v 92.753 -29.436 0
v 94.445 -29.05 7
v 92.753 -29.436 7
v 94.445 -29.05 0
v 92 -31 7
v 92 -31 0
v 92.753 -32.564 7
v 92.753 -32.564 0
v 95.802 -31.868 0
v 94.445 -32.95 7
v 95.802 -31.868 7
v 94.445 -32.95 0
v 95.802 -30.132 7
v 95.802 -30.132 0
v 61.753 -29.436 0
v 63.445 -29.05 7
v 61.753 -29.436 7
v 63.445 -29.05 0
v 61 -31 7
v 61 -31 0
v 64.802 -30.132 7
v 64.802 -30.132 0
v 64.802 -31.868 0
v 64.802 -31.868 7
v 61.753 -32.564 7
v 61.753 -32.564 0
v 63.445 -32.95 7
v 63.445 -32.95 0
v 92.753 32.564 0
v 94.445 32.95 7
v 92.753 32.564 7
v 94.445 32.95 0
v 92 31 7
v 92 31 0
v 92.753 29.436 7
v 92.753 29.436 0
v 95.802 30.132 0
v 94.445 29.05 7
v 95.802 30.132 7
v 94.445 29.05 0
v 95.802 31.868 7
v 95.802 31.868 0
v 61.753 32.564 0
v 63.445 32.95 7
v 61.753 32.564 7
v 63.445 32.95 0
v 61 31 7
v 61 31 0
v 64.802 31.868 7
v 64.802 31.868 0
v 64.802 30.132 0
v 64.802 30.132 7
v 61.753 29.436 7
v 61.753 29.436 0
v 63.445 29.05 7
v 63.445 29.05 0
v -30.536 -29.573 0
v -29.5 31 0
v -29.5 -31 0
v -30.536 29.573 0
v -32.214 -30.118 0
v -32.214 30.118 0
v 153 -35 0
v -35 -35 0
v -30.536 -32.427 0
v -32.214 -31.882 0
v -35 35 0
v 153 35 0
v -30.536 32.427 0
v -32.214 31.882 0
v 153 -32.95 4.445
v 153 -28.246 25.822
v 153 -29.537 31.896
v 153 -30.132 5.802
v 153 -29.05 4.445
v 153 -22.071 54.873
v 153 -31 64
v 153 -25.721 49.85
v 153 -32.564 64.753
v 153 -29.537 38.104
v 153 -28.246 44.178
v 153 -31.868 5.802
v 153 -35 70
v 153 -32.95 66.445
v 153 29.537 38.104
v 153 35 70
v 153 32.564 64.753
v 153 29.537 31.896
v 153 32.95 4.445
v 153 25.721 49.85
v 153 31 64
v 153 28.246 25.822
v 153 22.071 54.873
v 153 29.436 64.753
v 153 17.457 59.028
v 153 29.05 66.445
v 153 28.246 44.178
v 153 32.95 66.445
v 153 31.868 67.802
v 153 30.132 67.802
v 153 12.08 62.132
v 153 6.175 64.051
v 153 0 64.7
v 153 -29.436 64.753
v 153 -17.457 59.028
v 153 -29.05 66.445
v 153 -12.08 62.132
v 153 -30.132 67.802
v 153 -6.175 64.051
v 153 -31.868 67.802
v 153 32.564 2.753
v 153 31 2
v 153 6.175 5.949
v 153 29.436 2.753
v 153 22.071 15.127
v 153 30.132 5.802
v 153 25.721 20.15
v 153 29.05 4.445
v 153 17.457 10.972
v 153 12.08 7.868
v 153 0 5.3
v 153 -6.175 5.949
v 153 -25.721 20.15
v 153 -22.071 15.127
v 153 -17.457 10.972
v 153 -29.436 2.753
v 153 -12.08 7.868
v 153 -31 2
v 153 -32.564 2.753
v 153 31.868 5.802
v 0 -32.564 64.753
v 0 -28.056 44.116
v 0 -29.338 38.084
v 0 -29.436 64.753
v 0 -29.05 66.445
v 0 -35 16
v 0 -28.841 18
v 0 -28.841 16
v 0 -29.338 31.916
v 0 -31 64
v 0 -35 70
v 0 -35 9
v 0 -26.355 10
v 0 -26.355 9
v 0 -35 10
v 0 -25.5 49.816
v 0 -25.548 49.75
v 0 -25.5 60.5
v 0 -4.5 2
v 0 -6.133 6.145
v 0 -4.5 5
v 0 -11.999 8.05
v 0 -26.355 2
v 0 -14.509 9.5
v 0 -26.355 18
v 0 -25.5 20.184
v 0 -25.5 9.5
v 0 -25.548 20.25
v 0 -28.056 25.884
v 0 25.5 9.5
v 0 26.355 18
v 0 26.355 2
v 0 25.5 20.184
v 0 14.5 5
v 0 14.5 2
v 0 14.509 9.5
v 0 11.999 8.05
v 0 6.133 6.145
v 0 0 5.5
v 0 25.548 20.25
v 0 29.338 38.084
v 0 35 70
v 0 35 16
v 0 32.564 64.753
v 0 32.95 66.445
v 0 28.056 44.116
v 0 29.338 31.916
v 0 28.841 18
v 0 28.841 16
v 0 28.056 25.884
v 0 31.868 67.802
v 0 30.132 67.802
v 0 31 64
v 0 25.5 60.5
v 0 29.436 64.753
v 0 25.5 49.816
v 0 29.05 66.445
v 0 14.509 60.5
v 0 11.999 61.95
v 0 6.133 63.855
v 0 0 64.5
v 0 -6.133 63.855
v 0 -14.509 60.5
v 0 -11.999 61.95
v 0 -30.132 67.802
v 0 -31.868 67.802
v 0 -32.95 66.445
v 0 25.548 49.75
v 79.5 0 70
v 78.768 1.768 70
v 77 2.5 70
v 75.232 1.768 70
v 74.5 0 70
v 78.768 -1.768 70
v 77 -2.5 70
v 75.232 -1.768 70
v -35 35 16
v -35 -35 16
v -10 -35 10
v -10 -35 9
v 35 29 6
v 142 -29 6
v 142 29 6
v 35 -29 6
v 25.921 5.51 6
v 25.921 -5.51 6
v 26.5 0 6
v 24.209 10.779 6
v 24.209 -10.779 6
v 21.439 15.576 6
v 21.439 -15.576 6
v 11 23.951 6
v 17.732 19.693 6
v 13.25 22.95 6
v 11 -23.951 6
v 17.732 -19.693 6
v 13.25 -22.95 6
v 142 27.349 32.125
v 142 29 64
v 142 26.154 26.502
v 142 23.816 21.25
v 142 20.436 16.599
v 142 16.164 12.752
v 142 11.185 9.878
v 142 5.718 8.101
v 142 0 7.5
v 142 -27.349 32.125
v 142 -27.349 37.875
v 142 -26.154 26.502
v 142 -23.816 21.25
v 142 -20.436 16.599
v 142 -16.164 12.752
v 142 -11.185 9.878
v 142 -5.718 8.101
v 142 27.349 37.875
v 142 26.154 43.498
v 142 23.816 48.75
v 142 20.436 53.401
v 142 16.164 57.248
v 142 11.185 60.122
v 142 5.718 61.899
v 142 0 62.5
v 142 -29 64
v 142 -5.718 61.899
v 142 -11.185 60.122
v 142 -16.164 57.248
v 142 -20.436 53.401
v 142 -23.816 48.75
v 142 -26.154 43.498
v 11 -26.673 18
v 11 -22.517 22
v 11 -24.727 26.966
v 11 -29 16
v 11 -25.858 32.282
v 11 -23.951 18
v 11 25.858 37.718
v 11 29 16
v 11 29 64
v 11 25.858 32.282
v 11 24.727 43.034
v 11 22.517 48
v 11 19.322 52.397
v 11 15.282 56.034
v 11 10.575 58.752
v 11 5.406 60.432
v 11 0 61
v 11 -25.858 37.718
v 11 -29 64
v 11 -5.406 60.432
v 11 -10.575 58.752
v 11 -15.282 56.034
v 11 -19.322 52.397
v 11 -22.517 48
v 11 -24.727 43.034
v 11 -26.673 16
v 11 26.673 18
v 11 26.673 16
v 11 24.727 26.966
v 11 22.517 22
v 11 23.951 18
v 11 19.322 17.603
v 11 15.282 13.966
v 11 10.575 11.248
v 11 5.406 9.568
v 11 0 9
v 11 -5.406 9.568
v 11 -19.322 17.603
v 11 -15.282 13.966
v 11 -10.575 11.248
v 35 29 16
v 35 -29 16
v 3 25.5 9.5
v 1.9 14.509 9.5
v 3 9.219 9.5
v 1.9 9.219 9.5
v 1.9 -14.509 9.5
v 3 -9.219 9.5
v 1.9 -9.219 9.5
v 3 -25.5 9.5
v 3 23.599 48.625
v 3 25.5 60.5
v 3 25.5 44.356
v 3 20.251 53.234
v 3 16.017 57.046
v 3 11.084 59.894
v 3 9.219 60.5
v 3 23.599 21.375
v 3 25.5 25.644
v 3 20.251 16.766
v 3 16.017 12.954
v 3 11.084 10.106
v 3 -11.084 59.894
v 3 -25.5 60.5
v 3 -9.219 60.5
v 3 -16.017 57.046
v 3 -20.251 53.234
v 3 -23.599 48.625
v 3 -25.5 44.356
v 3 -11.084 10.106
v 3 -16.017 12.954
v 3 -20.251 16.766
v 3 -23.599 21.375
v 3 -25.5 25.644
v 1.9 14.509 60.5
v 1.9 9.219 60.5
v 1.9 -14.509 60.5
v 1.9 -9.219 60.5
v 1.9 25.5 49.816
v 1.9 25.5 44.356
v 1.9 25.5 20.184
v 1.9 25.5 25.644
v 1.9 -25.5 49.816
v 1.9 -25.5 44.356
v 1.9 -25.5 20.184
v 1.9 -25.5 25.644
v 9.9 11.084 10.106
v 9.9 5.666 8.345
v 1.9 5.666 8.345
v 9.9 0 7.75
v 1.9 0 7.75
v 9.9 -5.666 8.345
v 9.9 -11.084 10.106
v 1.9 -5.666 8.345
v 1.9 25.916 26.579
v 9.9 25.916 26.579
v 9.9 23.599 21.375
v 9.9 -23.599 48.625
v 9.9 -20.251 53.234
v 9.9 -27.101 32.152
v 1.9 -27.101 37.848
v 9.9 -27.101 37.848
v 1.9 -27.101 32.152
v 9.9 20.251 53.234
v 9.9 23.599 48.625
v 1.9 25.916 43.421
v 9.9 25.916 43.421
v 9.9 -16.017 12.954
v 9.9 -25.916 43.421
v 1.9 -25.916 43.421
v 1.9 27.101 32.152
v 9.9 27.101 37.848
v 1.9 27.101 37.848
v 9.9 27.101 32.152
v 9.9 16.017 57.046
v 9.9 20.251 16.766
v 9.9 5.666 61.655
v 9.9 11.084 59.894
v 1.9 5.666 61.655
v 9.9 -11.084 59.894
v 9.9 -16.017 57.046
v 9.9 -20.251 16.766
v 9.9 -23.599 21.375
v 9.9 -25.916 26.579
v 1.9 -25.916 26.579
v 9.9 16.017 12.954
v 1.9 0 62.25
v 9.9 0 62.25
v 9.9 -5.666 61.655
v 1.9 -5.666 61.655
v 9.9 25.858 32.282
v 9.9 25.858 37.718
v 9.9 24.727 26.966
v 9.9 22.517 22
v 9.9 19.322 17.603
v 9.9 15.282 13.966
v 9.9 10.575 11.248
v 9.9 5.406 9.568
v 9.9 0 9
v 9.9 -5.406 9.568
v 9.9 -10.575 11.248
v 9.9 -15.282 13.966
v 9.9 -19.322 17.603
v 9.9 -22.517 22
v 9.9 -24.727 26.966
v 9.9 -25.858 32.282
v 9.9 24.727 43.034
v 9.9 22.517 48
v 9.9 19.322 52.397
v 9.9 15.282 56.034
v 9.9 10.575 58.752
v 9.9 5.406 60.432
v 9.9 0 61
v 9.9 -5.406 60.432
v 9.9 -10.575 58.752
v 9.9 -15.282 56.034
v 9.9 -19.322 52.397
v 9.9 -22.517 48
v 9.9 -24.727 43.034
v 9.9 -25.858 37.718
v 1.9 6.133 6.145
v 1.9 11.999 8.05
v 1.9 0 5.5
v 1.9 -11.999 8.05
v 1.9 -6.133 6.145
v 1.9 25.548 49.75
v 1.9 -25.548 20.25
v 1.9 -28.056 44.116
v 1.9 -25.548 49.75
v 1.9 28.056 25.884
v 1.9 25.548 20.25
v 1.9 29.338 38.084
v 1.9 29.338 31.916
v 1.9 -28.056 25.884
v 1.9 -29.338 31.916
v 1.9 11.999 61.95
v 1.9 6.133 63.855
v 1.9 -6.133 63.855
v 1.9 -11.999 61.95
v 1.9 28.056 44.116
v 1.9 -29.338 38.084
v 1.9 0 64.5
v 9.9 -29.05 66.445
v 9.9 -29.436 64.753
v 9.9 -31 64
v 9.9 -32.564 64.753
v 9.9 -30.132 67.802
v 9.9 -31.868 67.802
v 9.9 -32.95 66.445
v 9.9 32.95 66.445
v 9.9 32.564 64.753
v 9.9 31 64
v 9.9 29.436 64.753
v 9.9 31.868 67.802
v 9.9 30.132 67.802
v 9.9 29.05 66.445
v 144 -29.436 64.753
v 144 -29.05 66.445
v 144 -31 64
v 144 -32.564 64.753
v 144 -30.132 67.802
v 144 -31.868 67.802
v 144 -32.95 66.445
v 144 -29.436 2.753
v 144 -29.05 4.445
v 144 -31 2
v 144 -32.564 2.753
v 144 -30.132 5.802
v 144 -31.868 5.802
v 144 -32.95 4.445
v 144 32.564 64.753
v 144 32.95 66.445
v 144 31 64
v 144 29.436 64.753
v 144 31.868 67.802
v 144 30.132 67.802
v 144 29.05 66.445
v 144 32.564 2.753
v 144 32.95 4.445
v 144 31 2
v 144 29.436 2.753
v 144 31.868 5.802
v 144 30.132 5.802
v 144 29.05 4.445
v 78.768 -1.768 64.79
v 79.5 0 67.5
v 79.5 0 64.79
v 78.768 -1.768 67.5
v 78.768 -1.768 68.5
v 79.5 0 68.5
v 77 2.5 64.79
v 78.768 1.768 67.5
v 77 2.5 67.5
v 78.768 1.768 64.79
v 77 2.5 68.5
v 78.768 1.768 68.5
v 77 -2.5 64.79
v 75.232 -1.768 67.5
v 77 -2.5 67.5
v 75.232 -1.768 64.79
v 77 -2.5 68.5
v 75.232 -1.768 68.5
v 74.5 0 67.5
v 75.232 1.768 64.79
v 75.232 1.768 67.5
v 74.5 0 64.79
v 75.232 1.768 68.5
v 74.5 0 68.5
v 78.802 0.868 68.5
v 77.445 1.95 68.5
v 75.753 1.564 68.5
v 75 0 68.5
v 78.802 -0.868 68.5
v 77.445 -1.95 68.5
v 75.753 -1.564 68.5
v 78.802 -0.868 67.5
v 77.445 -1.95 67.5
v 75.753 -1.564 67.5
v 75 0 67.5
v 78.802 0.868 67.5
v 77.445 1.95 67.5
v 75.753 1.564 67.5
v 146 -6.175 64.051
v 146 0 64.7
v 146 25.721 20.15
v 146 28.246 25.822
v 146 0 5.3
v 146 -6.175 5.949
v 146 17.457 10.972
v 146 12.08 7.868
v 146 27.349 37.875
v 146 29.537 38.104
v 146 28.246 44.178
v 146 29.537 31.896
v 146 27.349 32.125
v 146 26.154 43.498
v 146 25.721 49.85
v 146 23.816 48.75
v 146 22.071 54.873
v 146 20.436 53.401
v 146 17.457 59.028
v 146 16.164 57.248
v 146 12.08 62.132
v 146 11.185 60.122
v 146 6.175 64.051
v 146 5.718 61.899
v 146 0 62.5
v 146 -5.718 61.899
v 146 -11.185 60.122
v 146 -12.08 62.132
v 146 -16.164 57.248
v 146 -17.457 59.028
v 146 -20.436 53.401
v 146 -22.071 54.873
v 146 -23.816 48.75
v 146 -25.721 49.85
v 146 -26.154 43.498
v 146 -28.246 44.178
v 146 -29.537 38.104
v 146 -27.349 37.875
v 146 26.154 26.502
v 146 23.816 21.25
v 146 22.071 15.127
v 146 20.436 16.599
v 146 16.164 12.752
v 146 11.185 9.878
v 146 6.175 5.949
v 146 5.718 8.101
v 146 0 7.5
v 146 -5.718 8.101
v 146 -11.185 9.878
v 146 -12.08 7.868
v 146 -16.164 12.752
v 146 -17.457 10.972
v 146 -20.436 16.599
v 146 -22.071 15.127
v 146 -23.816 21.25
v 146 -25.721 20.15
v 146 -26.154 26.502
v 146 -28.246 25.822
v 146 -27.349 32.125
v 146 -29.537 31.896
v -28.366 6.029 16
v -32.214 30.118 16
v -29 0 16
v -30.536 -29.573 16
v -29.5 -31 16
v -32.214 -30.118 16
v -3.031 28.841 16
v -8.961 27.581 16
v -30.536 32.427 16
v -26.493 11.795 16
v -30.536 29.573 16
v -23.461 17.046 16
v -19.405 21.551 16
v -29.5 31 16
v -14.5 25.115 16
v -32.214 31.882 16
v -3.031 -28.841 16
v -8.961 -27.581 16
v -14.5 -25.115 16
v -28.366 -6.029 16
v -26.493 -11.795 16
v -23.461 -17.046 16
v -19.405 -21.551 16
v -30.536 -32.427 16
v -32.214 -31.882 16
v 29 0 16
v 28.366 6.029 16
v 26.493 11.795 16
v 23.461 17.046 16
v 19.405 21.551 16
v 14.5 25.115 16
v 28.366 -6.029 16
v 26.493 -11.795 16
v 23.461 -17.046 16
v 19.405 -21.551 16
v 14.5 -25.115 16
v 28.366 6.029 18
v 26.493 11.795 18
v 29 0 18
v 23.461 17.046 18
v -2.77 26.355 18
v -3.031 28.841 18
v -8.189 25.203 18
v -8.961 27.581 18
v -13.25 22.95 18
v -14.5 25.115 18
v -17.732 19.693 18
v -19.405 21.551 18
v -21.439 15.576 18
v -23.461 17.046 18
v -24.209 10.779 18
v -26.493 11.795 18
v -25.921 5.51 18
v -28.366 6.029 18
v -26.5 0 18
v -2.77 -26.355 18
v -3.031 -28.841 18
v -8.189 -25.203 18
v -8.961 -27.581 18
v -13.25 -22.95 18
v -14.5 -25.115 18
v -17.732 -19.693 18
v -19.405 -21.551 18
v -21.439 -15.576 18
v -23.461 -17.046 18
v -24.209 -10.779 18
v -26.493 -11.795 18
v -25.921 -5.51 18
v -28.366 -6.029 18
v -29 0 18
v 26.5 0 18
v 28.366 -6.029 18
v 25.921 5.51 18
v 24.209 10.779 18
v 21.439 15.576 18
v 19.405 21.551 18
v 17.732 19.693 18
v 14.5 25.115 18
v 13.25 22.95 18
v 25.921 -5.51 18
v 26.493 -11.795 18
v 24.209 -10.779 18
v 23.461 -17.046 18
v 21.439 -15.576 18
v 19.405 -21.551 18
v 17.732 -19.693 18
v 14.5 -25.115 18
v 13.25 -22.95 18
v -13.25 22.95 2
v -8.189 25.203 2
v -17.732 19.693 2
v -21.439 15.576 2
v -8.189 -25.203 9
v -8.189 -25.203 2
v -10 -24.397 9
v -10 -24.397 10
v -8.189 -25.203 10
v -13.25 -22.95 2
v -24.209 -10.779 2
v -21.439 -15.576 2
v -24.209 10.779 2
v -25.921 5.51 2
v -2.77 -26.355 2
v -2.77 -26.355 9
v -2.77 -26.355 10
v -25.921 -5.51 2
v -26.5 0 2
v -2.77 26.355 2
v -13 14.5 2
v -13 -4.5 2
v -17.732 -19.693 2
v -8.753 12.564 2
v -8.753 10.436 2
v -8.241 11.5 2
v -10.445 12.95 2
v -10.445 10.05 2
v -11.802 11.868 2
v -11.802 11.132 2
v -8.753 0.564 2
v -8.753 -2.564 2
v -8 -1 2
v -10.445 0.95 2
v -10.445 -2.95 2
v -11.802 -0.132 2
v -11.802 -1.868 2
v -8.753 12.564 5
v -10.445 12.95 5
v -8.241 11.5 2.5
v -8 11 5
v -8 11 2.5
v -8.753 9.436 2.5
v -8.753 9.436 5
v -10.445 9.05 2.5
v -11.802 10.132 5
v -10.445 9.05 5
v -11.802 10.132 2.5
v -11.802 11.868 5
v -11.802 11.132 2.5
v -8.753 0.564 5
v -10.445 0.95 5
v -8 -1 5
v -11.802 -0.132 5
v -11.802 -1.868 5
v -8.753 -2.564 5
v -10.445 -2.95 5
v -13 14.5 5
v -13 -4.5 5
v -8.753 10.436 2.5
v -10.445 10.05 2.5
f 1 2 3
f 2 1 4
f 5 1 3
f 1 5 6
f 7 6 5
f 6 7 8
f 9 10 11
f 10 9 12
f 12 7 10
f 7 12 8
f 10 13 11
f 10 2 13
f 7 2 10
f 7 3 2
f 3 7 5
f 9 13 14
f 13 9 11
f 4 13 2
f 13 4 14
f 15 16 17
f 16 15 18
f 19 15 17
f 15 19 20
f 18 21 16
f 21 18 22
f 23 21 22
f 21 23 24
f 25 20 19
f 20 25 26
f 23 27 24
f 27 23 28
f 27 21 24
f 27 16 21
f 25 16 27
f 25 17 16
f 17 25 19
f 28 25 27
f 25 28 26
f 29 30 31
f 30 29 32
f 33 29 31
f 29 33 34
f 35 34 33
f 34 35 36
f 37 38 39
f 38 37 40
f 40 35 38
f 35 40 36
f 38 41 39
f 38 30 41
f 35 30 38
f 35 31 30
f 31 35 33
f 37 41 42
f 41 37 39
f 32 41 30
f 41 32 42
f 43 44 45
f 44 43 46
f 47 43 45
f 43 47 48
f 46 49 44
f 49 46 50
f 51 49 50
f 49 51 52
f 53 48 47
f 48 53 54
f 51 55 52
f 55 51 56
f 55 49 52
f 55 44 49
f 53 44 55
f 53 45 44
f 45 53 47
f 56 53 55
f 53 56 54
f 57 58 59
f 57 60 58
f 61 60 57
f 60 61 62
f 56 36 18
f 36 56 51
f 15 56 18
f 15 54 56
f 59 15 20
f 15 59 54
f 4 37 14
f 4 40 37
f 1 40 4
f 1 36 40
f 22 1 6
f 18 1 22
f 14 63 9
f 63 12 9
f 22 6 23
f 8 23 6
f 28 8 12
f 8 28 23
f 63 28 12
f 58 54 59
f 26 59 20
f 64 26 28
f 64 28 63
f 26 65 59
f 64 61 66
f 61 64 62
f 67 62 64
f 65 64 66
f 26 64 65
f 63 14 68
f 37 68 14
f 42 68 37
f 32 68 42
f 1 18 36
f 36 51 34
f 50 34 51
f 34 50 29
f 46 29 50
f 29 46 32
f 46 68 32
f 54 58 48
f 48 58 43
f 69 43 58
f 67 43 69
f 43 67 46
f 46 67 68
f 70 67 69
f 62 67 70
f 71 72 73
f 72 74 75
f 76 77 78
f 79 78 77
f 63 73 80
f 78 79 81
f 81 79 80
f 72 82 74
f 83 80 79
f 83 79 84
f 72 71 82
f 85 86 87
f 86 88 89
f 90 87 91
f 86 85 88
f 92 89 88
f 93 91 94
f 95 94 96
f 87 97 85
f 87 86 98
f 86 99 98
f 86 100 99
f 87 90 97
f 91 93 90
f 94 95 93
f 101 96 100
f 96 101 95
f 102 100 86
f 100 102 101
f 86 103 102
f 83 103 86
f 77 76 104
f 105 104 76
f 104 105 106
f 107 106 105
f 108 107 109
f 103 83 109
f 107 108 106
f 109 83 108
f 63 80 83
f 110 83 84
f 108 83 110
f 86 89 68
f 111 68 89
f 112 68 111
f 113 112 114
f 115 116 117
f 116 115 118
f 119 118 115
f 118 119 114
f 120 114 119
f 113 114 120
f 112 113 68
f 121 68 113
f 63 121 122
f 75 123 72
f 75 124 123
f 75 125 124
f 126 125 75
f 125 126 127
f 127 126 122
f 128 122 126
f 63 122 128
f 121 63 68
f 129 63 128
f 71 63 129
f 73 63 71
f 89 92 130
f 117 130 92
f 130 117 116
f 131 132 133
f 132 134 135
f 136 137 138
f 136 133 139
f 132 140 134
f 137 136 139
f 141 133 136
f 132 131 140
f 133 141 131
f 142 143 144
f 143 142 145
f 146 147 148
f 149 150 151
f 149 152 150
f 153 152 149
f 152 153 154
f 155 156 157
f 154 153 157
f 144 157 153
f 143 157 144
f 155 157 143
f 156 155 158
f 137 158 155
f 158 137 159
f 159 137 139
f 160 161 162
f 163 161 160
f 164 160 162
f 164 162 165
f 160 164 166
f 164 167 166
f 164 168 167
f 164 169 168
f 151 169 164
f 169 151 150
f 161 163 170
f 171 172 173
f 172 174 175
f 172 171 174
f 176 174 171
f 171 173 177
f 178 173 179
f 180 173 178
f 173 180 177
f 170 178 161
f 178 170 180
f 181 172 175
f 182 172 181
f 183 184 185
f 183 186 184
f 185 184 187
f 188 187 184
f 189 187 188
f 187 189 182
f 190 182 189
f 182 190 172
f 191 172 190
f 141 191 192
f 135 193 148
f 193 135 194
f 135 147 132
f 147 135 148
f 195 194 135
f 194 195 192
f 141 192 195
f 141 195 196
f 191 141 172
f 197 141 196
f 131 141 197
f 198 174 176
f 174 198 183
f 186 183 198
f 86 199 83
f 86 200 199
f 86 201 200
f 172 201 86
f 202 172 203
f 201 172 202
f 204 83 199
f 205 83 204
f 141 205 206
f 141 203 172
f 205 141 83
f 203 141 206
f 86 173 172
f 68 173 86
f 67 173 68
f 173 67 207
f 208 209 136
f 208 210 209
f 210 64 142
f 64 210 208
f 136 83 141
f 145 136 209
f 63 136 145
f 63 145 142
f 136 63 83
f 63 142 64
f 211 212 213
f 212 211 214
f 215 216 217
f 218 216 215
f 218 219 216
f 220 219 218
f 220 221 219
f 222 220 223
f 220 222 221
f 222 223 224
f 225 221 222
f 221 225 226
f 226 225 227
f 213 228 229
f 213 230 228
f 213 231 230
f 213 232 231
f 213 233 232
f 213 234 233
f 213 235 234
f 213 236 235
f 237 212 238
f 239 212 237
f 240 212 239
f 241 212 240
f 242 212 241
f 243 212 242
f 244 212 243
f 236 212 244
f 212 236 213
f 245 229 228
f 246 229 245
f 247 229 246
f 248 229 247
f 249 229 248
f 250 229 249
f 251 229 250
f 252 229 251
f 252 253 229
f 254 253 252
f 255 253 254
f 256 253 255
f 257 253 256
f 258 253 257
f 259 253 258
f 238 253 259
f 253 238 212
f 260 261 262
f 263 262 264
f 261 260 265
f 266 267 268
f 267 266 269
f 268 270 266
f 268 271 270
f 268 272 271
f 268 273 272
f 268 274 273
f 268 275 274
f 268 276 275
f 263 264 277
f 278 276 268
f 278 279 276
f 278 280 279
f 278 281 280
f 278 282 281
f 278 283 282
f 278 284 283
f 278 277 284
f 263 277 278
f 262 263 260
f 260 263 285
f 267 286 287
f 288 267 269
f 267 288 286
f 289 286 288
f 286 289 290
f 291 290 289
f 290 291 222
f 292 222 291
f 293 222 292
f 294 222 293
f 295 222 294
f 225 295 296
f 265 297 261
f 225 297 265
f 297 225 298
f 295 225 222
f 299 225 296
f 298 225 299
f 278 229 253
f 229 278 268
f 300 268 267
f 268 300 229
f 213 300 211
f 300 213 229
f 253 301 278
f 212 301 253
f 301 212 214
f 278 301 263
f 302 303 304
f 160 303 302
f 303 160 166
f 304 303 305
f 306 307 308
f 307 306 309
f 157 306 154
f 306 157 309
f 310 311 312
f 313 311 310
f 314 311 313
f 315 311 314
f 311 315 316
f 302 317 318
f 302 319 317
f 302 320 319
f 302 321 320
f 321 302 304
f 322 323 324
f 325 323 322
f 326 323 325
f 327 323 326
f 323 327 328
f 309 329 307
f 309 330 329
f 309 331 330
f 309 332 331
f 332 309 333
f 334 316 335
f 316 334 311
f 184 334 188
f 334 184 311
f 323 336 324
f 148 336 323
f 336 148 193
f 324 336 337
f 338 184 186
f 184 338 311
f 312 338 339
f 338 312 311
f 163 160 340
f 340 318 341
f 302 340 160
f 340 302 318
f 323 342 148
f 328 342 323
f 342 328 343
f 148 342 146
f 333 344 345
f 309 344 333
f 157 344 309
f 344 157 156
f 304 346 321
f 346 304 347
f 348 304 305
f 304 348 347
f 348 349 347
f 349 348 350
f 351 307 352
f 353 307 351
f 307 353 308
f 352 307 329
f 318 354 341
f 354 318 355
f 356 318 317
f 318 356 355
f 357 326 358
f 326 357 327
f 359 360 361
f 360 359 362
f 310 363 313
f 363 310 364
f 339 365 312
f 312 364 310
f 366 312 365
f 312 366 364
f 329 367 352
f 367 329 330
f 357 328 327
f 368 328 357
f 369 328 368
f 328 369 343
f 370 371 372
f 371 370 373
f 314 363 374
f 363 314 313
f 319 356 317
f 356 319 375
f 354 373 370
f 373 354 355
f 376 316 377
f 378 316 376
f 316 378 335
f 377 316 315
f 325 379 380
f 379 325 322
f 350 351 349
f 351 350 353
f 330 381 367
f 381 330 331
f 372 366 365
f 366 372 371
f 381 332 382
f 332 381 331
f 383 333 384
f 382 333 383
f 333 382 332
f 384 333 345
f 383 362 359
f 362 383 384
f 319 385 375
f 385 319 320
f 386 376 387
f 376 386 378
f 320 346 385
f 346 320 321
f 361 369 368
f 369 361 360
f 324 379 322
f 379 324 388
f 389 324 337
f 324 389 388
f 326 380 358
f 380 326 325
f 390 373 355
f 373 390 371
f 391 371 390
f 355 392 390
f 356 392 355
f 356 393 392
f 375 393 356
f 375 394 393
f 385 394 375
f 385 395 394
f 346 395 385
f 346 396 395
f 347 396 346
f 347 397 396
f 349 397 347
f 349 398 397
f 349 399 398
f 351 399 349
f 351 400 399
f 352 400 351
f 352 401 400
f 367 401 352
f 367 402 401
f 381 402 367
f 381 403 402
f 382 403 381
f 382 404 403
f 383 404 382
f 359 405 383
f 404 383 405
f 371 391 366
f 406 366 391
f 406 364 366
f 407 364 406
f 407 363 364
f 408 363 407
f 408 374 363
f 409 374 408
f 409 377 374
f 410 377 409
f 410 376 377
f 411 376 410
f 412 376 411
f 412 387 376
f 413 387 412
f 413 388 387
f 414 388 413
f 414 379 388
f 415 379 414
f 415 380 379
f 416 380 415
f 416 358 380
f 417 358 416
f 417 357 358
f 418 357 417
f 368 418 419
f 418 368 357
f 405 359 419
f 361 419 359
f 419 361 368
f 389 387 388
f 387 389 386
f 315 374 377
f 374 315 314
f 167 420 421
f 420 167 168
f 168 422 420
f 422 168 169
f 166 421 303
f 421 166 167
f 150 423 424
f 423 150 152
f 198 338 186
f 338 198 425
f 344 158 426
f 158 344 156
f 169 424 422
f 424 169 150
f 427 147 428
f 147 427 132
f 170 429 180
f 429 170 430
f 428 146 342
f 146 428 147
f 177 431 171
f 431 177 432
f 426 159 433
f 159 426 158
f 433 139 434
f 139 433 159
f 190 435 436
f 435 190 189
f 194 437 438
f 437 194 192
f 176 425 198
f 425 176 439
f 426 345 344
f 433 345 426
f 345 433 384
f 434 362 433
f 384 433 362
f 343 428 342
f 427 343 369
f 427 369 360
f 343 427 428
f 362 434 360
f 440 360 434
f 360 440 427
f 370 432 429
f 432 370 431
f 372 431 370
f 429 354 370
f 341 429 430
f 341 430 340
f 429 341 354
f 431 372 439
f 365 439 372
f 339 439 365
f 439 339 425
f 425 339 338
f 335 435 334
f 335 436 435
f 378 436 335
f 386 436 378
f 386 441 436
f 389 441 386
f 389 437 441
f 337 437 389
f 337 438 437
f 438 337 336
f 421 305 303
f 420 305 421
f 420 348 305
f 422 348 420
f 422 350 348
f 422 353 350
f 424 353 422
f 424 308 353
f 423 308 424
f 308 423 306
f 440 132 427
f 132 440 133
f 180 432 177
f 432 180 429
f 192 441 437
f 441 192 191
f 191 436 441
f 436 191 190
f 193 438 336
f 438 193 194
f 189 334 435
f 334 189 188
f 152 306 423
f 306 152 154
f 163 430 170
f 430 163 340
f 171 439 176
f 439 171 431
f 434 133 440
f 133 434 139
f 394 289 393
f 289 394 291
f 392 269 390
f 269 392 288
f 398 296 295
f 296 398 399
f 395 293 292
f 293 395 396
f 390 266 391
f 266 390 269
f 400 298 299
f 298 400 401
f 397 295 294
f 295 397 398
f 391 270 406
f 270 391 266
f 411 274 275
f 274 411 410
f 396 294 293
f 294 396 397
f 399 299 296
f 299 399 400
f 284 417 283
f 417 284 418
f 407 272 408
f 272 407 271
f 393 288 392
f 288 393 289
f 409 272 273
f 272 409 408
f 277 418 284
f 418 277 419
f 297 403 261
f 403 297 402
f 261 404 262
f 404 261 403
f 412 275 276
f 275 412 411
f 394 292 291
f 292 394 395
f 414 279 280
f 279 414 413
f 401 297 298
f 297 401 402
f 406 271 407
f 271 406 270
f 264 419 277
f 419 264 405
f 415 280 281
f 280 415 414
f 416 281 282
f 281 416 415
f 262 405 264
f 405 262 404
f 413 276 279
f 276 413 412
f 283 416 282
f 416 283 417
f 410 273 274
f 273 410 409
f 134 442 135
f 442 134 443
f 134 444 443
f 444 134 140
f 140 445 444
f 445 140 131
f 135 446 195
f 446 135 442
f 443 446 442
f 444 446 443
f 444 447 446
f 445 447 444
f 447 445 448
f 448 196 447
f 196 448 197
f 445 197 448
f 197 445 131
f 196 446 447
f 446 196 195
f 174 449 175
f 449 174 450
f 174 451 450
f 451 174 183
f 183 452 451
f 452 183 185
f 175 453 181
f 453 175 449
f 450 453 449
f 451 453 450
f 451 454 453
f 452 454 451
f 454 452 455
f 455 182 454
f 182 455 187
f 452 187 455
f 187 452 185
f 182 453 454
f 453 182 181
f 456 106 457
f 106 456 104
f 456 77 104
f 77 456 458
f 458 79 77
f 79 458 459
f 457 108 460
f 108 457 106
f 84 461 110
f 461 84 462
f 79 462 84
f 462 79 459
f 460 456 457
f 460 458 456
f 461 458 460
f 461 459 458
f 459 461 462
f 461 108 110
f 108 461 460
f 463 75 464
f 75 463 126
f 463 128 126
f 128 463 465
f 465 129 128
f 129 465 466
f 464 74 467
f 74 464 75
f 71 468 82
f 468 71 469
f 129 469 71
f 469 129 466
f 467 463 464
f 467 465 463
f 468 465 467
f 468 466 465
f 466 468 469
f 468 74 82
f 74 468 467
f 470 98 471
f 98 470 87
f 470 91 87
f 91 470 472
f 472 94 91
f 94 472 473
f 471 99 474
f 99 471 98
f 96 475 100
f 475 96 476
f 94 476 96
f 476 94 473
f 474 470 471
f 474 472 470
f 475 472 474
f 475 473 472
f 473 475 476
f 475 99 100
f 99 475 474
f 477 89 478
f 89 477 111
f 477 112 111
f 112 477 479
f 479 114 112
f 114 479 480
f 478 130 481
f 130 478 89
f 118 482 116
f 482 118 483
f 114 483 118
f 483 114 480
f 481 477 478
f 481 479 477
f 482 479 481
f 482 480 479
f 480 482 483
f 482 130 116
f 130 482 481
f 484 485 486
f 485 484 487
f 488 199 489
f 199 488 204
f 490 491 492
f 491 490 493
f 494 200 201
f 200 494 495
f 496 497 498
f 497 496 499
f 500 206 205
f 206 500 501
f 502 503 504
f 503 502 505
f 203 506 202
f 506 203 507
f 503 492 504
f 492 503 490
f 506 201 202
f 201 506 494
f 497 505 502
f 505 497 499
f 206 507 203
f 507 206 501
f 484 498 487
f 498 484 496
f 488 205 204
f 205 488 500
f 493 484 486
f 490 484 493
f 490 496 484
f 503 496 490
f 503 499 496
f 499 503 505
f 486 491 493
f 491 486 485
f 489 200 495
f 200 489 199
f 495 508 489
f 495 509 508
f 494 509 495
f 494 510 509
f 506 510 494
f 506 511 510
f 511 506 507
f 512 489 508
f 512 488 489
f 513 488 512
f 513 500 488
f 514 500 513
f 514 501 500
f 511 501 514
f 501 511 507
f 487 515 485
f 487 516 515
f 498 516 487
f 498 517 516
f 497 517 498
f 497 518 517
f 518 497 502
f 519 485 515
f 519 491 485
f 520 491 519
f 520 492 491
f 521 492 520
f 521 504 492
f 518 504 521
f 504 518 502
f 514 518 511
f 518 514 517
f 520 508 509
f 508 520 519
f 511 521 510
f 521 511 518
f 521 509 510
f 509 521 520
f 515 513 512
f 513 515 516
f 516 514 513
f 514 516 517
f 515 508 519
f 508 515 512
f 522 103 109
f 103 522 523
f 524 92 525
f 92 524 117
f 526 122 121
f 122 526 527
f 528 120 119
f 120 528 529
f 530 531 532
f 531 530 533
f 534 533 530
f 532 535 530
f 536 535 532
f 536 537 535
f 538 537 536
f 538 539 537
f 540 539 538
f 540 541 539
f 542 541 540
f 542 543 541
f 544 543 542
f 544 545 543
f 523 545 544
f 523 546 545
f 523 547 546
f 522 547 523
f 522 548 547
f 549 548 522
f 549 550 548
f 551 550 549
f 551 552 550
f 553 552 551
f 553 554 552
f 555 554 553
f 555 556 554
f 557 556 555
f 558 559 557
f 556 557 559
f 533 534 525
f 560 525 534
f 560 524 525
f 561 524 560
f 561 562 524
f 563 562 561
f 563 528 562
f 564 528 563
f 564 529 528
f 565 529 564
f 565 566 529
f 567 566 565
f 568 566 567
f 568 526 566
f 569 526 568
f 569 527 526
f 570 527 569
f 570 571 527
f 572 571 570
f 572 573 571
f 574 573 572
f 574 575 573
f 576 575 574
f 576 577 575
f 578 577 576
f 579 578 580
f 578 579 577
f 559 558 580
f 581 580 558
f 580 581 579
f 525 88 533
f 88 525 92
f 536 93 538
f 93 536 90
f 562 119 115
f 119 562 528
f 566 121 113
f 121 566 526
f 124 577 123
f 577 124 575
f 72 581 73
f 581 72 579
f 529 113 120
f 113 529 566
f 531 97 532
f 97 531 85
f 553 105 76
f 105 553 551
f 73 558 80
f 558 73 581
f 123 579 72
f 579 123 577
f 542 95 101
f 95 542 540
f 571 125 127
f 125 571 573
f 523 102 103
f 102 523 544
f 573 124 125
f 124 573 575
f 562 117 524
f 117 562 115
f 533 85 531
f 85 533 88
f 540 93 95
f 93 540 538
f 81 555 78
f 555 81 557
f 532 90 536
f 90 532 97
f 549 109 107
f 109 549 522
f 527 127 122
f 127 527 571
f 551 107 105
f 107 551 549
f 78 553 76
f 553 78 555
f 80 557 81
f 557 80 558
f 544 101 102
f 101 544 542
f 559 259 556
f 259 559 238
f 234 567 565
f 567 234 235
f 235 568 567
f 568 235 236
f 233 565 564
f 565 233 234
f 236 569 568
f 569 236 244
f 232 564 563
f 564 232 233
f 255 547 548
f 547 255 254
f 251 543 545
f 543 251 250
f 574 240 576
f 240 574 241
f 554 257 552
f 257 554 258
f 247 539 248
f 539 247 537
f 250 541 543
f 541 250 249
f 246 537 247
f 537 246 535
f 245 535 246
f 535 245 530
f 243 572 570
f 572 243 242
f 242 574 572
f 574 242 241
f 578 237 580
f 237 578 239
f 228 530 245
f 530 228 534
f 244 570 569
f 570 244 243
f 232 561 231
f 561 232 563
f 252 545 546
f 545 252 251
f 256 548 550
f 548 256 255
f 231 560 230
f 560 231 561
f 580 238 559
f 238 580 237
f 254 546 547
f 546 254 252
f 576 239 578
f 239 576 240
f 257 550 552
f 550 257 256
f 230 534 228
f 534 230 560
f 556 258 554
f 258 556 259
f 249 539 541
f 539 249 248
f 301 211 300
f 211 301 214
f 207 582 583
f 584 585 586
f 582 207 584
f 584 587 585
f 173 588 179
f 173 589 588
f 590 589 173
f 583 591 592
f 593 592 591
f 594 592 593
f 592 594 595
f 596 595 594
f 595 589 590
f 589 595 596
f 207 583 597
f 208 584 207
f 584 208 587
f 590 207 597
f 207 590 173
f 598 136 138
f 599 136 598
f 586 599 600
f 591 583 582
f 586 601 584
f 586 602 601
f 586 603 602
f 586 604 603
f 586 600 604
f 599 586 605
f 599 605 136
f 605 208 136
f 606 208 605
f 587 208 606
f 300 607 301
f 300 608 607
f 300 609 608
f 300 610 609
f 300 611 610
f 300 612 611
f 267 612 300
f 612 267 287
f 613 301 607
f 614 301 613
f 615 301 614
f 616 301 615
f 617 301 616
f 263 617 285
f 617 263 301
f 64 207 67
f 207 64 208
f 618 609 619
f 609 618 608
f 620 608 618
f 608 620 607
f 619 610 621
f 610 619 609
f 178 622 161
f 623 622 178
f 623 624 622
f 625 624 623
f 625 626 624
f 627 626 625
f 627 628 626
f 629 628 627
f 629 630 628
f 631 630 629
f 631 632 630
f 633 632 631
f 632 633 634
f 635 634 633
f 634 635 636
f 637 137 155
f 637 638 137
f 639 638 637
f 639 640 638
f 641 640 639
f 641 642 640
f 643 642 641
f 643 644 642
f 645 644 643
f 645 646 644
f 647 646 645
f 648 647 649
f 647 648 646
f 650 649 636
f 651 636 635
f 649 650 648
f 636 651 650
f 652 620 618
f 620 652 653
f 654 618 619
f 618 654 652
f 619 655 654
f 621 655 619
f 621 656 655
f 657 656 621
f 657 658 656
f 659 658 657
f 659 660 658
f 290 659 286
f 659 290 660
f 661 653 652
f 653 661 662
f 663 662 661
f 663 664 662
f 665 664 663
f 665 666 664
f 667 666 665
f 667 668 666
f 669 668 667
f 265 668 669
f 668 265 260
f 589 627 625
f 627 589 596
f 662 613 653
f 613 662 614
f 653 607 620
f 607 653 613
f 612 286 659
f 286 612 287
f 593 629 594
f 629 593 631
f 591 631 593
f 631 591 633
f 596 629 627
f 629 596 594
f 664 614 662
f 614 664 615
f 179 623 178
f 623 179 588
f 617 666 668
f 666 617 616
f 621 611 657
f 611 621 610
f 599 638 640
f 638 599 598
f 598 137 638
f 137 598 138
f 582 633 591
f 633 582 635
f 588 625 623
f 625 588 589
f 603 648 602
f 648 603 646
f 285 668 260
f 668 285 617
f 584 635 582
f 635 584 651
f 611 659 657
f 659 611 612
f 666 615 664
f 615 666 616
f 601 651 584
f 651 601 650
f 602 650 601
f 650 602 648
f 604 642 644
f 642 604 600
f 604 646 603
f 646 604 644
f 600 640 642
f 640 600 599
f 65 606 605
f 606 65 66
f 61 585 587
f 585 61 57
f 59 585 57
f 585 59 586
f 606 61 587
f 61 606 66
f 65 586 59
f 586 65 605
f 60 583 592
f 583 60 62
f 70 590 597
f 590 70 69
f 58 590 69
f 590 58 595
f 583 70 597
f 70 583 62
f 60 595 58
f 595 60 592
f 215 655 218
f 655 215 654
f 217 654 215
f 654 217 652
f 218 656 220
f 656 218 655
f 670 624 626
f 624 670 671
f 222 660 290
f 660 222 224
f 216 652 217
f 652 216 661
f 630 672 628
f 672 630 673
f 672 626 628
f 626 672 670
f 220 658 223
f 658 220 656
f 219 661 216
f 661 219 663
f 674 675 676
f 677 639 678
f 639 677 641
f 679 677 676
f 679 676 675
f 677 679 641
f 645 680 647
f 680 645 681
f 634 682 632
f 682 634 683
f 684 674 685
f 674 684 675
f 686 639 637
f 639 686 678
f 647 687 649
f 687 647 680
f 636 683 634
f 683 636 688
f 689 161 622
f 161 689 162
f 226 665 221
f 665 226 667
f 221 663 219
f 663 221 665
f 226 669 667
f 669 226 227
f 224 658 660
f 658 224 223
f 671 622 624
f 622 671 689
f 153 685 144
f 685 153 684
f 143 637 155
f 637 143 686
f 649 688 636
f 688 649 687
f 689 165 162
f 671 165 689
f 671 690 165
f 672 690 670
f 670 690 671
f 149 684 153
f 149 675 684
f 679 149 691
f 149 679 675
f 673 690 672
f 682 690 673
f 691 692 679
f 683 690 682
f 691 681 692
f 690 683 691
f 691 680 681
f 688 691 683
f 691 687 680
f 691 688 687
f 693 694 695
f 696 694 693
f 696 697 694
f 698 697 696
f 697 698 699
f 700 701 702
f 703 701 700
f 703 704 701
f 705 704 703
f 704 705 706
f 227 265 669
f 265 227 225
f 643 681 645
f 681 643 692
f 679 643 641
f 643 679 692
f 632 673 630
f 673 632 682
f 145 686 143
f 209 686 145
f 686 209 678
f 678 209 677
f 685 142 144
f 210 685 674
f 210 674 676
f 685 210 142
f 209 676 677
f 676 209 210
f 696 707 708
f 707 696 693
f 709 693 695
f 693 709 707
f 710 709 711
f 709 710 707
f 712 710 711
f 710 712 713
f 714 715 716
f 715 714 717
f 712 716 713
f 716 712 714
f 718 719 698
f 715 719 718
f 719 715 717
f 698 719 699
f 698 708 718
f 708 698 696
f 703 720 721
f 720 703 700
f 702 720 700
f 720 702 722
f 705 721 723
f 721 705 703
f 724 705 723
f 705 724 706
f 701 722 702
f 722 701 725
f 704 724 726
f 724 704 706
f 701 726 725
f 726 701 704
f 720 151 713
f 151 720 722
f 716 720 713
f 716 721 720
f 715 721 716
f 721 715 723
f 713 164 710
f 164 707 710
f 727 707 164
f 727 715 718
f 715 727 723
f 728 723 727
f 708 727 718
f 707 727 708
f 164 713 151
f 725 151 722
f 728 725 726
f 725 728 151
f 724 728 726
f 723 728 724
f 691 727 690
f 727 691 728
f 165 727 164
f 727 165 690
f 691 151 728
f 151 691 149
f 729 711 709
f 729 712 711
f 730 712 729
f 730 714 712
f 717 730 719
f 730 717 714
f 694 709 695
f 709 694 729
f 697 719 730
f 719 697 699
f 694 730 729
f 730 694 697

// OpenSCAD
// file: Tubo.scad
bigW = 70;
ori = bigW/2;
raspSellR = 59;
tuboH = 140;
H = tuboH+2+8+1+2;
selloH = 7;

huecoPared = 12;
huecoH = 22;

translate([0,0,bigW/2])
rotate([0,90,0])
bigTuboHueco();

module bigTuboHueco()
{
	difference()
	{
		bigTubo();	
		sello();
	}
}


module sello()
{
	translate([0,0,H-selloH])
	cylinder(r=(raspSellR/2)+0.2,selloH+0.1);
	
	translate([0,0,H-selloH-30])
	cylinder(r=(raspSellR/2)-2,selloH+40);
}


module bigTubo(){

difference(){

//Bloque
translate([-bigW/2,-bigW/2,0])
cube([bigW,bigW,H]);


translate([
						-(bigW-huecoPared)/2,
						-(bigW-huecoPared)/2,
						(huecoH/2)
					])
		cube([
					bigW-huecoPared,
					bigW-huecoPared,
					H-huecoH]
				);


//Diffractador
translate([-25.5,-25.5,-0.1])
cube([51,51,3.1]);

//Macro
translate([0,0,-0.1])
cylinder(r=(54.5/2),10);

//Sello de raspberry
translate([0,0,-0.1])
cylinder(r=(raspSellR/2),2);

//Tubo
translate([0,0,-0.1])
cylinder(r=(52/2),200);

//Tornillos abajo
translate([-ori+4,-ori+4,-0.1])
cylinder(r=2,10);
translate([ori-4,-ori+4,-0.1])
cylinder(r=2,10);
translate([-ori+4,ori-4,-0.1])
cylinder(r=2,10);
translate([ori-4,ori-4,-0.1])
cylinder(r=2,10);

//Hueco
//translate([0,0,2+8+1+2])
//cylinder(r=(raspSellR/2),tuboH+0.1);

//Tornillos arriba
translate([-ori+4,-ori+4,H-9])
cylinder(r=2,10);
translate([ori-4,-ori+4,H-9])
cylinder(r=2,10);
translate([-ori+4,ori-4,H-9])
cylinder(r=2,10);
translate([ori-4,ori-4,H-9])
cylinder(r=2,10);

//Tornillos caja
translate([0,0,(tuboH/2)-7])
rotate([0,90,0])
tornillosArriba();

//Tornillo tripie
translate([-ori-0.1,0,(tuboH/2)+7])
rotate([0,90,0])
cylinder(r=5/2,5.31);


}


//Rosca tornillo tripie
difference(){
translate([-ori+1.5,0,(tuboH/2)+7])
rotate([0,90,0])
cylinder(r=5,1);

translate([-ori+1.4,0,(tuboH/2)+7])
rotate([0,90,0])
cylinder(r=5-3,3);


}

}

module tornillosArriba(){
translate([-ori+4,-ori+4,ori-7])
cylinder(r=2,10);
translate([0,-ori+4,ori-7])
cylinder(r=2,10);
translate([-ori+4,ori-4,ori-7])
cylinder(r=2,10);
translate([0,ori-4,ori-7])
cylinder(r=2,10);
}


module tornilloTripie(){
	
}
// file: Camara.scad
include <Tubo.scad>



//translate([0,0,30])
//bigTubo();

Camara();




module Camara(){

//Alsa para cámara
//translate([-12.5,-10,5])
//cube([25,24,2]);

difference(){

//Crear bloque
creaBloqueCam();

//Tornillos abajo
translate([-ori+4,-ori+4,-0.1])
cylinder(r=1.5,30);
translate([ori-4,-ori+4,-0.1])
cylinder(r=1.5,30);
translate([-ori+4,ori-4,-0.1])
cylinder(r=1.5,30);
translate([ori-4,ori-4,-0.1])
cylinder(r=1.5,30);

//Tubo para camara
translate([0,0,2])
cylinder(r=(raspSellR/2)-3,18);

//Ranura cable
translate([-10,-ori-5,9])
cube([20,20,1]);

}


difference(){

translate([-13,-4.5,1])
cube([26,19,4]);

tornCam();
}





}


module tornCam(){
//Tornillos camara
translate([-10,11,-0.1])
cylinder(r=2,30);
translate([10,11,-0.1])
cylinder(r=2,30);
translate([-10,-1,-0.1])
cylinder(r=2,30);
translate([10,-1,-0.1])
cylinder(r=2,30);
}


module creaBloqueCam(){
//Bloque
translate([-bigW/2,-bigW/2,0])
cube([bigW,bigW,16]);

//Sello
cylinder(r=(raspSellR/2)-0.5,18);


}
// main file
include <Camara.scad>


difference(){

translate([-13,-4.5,1])
cube([26,19,1.5]);

//Tornillos camara
translate([-10,12,-0.1])
cylinder(r=2,30);
translate([10,12,-0.1])
cylinder(r=2,30);
translate([-10,-1,-0.1])
cylinder(r=2,30);
translate([10,-1,-0.1])
cylinder(r=2,30);

}
